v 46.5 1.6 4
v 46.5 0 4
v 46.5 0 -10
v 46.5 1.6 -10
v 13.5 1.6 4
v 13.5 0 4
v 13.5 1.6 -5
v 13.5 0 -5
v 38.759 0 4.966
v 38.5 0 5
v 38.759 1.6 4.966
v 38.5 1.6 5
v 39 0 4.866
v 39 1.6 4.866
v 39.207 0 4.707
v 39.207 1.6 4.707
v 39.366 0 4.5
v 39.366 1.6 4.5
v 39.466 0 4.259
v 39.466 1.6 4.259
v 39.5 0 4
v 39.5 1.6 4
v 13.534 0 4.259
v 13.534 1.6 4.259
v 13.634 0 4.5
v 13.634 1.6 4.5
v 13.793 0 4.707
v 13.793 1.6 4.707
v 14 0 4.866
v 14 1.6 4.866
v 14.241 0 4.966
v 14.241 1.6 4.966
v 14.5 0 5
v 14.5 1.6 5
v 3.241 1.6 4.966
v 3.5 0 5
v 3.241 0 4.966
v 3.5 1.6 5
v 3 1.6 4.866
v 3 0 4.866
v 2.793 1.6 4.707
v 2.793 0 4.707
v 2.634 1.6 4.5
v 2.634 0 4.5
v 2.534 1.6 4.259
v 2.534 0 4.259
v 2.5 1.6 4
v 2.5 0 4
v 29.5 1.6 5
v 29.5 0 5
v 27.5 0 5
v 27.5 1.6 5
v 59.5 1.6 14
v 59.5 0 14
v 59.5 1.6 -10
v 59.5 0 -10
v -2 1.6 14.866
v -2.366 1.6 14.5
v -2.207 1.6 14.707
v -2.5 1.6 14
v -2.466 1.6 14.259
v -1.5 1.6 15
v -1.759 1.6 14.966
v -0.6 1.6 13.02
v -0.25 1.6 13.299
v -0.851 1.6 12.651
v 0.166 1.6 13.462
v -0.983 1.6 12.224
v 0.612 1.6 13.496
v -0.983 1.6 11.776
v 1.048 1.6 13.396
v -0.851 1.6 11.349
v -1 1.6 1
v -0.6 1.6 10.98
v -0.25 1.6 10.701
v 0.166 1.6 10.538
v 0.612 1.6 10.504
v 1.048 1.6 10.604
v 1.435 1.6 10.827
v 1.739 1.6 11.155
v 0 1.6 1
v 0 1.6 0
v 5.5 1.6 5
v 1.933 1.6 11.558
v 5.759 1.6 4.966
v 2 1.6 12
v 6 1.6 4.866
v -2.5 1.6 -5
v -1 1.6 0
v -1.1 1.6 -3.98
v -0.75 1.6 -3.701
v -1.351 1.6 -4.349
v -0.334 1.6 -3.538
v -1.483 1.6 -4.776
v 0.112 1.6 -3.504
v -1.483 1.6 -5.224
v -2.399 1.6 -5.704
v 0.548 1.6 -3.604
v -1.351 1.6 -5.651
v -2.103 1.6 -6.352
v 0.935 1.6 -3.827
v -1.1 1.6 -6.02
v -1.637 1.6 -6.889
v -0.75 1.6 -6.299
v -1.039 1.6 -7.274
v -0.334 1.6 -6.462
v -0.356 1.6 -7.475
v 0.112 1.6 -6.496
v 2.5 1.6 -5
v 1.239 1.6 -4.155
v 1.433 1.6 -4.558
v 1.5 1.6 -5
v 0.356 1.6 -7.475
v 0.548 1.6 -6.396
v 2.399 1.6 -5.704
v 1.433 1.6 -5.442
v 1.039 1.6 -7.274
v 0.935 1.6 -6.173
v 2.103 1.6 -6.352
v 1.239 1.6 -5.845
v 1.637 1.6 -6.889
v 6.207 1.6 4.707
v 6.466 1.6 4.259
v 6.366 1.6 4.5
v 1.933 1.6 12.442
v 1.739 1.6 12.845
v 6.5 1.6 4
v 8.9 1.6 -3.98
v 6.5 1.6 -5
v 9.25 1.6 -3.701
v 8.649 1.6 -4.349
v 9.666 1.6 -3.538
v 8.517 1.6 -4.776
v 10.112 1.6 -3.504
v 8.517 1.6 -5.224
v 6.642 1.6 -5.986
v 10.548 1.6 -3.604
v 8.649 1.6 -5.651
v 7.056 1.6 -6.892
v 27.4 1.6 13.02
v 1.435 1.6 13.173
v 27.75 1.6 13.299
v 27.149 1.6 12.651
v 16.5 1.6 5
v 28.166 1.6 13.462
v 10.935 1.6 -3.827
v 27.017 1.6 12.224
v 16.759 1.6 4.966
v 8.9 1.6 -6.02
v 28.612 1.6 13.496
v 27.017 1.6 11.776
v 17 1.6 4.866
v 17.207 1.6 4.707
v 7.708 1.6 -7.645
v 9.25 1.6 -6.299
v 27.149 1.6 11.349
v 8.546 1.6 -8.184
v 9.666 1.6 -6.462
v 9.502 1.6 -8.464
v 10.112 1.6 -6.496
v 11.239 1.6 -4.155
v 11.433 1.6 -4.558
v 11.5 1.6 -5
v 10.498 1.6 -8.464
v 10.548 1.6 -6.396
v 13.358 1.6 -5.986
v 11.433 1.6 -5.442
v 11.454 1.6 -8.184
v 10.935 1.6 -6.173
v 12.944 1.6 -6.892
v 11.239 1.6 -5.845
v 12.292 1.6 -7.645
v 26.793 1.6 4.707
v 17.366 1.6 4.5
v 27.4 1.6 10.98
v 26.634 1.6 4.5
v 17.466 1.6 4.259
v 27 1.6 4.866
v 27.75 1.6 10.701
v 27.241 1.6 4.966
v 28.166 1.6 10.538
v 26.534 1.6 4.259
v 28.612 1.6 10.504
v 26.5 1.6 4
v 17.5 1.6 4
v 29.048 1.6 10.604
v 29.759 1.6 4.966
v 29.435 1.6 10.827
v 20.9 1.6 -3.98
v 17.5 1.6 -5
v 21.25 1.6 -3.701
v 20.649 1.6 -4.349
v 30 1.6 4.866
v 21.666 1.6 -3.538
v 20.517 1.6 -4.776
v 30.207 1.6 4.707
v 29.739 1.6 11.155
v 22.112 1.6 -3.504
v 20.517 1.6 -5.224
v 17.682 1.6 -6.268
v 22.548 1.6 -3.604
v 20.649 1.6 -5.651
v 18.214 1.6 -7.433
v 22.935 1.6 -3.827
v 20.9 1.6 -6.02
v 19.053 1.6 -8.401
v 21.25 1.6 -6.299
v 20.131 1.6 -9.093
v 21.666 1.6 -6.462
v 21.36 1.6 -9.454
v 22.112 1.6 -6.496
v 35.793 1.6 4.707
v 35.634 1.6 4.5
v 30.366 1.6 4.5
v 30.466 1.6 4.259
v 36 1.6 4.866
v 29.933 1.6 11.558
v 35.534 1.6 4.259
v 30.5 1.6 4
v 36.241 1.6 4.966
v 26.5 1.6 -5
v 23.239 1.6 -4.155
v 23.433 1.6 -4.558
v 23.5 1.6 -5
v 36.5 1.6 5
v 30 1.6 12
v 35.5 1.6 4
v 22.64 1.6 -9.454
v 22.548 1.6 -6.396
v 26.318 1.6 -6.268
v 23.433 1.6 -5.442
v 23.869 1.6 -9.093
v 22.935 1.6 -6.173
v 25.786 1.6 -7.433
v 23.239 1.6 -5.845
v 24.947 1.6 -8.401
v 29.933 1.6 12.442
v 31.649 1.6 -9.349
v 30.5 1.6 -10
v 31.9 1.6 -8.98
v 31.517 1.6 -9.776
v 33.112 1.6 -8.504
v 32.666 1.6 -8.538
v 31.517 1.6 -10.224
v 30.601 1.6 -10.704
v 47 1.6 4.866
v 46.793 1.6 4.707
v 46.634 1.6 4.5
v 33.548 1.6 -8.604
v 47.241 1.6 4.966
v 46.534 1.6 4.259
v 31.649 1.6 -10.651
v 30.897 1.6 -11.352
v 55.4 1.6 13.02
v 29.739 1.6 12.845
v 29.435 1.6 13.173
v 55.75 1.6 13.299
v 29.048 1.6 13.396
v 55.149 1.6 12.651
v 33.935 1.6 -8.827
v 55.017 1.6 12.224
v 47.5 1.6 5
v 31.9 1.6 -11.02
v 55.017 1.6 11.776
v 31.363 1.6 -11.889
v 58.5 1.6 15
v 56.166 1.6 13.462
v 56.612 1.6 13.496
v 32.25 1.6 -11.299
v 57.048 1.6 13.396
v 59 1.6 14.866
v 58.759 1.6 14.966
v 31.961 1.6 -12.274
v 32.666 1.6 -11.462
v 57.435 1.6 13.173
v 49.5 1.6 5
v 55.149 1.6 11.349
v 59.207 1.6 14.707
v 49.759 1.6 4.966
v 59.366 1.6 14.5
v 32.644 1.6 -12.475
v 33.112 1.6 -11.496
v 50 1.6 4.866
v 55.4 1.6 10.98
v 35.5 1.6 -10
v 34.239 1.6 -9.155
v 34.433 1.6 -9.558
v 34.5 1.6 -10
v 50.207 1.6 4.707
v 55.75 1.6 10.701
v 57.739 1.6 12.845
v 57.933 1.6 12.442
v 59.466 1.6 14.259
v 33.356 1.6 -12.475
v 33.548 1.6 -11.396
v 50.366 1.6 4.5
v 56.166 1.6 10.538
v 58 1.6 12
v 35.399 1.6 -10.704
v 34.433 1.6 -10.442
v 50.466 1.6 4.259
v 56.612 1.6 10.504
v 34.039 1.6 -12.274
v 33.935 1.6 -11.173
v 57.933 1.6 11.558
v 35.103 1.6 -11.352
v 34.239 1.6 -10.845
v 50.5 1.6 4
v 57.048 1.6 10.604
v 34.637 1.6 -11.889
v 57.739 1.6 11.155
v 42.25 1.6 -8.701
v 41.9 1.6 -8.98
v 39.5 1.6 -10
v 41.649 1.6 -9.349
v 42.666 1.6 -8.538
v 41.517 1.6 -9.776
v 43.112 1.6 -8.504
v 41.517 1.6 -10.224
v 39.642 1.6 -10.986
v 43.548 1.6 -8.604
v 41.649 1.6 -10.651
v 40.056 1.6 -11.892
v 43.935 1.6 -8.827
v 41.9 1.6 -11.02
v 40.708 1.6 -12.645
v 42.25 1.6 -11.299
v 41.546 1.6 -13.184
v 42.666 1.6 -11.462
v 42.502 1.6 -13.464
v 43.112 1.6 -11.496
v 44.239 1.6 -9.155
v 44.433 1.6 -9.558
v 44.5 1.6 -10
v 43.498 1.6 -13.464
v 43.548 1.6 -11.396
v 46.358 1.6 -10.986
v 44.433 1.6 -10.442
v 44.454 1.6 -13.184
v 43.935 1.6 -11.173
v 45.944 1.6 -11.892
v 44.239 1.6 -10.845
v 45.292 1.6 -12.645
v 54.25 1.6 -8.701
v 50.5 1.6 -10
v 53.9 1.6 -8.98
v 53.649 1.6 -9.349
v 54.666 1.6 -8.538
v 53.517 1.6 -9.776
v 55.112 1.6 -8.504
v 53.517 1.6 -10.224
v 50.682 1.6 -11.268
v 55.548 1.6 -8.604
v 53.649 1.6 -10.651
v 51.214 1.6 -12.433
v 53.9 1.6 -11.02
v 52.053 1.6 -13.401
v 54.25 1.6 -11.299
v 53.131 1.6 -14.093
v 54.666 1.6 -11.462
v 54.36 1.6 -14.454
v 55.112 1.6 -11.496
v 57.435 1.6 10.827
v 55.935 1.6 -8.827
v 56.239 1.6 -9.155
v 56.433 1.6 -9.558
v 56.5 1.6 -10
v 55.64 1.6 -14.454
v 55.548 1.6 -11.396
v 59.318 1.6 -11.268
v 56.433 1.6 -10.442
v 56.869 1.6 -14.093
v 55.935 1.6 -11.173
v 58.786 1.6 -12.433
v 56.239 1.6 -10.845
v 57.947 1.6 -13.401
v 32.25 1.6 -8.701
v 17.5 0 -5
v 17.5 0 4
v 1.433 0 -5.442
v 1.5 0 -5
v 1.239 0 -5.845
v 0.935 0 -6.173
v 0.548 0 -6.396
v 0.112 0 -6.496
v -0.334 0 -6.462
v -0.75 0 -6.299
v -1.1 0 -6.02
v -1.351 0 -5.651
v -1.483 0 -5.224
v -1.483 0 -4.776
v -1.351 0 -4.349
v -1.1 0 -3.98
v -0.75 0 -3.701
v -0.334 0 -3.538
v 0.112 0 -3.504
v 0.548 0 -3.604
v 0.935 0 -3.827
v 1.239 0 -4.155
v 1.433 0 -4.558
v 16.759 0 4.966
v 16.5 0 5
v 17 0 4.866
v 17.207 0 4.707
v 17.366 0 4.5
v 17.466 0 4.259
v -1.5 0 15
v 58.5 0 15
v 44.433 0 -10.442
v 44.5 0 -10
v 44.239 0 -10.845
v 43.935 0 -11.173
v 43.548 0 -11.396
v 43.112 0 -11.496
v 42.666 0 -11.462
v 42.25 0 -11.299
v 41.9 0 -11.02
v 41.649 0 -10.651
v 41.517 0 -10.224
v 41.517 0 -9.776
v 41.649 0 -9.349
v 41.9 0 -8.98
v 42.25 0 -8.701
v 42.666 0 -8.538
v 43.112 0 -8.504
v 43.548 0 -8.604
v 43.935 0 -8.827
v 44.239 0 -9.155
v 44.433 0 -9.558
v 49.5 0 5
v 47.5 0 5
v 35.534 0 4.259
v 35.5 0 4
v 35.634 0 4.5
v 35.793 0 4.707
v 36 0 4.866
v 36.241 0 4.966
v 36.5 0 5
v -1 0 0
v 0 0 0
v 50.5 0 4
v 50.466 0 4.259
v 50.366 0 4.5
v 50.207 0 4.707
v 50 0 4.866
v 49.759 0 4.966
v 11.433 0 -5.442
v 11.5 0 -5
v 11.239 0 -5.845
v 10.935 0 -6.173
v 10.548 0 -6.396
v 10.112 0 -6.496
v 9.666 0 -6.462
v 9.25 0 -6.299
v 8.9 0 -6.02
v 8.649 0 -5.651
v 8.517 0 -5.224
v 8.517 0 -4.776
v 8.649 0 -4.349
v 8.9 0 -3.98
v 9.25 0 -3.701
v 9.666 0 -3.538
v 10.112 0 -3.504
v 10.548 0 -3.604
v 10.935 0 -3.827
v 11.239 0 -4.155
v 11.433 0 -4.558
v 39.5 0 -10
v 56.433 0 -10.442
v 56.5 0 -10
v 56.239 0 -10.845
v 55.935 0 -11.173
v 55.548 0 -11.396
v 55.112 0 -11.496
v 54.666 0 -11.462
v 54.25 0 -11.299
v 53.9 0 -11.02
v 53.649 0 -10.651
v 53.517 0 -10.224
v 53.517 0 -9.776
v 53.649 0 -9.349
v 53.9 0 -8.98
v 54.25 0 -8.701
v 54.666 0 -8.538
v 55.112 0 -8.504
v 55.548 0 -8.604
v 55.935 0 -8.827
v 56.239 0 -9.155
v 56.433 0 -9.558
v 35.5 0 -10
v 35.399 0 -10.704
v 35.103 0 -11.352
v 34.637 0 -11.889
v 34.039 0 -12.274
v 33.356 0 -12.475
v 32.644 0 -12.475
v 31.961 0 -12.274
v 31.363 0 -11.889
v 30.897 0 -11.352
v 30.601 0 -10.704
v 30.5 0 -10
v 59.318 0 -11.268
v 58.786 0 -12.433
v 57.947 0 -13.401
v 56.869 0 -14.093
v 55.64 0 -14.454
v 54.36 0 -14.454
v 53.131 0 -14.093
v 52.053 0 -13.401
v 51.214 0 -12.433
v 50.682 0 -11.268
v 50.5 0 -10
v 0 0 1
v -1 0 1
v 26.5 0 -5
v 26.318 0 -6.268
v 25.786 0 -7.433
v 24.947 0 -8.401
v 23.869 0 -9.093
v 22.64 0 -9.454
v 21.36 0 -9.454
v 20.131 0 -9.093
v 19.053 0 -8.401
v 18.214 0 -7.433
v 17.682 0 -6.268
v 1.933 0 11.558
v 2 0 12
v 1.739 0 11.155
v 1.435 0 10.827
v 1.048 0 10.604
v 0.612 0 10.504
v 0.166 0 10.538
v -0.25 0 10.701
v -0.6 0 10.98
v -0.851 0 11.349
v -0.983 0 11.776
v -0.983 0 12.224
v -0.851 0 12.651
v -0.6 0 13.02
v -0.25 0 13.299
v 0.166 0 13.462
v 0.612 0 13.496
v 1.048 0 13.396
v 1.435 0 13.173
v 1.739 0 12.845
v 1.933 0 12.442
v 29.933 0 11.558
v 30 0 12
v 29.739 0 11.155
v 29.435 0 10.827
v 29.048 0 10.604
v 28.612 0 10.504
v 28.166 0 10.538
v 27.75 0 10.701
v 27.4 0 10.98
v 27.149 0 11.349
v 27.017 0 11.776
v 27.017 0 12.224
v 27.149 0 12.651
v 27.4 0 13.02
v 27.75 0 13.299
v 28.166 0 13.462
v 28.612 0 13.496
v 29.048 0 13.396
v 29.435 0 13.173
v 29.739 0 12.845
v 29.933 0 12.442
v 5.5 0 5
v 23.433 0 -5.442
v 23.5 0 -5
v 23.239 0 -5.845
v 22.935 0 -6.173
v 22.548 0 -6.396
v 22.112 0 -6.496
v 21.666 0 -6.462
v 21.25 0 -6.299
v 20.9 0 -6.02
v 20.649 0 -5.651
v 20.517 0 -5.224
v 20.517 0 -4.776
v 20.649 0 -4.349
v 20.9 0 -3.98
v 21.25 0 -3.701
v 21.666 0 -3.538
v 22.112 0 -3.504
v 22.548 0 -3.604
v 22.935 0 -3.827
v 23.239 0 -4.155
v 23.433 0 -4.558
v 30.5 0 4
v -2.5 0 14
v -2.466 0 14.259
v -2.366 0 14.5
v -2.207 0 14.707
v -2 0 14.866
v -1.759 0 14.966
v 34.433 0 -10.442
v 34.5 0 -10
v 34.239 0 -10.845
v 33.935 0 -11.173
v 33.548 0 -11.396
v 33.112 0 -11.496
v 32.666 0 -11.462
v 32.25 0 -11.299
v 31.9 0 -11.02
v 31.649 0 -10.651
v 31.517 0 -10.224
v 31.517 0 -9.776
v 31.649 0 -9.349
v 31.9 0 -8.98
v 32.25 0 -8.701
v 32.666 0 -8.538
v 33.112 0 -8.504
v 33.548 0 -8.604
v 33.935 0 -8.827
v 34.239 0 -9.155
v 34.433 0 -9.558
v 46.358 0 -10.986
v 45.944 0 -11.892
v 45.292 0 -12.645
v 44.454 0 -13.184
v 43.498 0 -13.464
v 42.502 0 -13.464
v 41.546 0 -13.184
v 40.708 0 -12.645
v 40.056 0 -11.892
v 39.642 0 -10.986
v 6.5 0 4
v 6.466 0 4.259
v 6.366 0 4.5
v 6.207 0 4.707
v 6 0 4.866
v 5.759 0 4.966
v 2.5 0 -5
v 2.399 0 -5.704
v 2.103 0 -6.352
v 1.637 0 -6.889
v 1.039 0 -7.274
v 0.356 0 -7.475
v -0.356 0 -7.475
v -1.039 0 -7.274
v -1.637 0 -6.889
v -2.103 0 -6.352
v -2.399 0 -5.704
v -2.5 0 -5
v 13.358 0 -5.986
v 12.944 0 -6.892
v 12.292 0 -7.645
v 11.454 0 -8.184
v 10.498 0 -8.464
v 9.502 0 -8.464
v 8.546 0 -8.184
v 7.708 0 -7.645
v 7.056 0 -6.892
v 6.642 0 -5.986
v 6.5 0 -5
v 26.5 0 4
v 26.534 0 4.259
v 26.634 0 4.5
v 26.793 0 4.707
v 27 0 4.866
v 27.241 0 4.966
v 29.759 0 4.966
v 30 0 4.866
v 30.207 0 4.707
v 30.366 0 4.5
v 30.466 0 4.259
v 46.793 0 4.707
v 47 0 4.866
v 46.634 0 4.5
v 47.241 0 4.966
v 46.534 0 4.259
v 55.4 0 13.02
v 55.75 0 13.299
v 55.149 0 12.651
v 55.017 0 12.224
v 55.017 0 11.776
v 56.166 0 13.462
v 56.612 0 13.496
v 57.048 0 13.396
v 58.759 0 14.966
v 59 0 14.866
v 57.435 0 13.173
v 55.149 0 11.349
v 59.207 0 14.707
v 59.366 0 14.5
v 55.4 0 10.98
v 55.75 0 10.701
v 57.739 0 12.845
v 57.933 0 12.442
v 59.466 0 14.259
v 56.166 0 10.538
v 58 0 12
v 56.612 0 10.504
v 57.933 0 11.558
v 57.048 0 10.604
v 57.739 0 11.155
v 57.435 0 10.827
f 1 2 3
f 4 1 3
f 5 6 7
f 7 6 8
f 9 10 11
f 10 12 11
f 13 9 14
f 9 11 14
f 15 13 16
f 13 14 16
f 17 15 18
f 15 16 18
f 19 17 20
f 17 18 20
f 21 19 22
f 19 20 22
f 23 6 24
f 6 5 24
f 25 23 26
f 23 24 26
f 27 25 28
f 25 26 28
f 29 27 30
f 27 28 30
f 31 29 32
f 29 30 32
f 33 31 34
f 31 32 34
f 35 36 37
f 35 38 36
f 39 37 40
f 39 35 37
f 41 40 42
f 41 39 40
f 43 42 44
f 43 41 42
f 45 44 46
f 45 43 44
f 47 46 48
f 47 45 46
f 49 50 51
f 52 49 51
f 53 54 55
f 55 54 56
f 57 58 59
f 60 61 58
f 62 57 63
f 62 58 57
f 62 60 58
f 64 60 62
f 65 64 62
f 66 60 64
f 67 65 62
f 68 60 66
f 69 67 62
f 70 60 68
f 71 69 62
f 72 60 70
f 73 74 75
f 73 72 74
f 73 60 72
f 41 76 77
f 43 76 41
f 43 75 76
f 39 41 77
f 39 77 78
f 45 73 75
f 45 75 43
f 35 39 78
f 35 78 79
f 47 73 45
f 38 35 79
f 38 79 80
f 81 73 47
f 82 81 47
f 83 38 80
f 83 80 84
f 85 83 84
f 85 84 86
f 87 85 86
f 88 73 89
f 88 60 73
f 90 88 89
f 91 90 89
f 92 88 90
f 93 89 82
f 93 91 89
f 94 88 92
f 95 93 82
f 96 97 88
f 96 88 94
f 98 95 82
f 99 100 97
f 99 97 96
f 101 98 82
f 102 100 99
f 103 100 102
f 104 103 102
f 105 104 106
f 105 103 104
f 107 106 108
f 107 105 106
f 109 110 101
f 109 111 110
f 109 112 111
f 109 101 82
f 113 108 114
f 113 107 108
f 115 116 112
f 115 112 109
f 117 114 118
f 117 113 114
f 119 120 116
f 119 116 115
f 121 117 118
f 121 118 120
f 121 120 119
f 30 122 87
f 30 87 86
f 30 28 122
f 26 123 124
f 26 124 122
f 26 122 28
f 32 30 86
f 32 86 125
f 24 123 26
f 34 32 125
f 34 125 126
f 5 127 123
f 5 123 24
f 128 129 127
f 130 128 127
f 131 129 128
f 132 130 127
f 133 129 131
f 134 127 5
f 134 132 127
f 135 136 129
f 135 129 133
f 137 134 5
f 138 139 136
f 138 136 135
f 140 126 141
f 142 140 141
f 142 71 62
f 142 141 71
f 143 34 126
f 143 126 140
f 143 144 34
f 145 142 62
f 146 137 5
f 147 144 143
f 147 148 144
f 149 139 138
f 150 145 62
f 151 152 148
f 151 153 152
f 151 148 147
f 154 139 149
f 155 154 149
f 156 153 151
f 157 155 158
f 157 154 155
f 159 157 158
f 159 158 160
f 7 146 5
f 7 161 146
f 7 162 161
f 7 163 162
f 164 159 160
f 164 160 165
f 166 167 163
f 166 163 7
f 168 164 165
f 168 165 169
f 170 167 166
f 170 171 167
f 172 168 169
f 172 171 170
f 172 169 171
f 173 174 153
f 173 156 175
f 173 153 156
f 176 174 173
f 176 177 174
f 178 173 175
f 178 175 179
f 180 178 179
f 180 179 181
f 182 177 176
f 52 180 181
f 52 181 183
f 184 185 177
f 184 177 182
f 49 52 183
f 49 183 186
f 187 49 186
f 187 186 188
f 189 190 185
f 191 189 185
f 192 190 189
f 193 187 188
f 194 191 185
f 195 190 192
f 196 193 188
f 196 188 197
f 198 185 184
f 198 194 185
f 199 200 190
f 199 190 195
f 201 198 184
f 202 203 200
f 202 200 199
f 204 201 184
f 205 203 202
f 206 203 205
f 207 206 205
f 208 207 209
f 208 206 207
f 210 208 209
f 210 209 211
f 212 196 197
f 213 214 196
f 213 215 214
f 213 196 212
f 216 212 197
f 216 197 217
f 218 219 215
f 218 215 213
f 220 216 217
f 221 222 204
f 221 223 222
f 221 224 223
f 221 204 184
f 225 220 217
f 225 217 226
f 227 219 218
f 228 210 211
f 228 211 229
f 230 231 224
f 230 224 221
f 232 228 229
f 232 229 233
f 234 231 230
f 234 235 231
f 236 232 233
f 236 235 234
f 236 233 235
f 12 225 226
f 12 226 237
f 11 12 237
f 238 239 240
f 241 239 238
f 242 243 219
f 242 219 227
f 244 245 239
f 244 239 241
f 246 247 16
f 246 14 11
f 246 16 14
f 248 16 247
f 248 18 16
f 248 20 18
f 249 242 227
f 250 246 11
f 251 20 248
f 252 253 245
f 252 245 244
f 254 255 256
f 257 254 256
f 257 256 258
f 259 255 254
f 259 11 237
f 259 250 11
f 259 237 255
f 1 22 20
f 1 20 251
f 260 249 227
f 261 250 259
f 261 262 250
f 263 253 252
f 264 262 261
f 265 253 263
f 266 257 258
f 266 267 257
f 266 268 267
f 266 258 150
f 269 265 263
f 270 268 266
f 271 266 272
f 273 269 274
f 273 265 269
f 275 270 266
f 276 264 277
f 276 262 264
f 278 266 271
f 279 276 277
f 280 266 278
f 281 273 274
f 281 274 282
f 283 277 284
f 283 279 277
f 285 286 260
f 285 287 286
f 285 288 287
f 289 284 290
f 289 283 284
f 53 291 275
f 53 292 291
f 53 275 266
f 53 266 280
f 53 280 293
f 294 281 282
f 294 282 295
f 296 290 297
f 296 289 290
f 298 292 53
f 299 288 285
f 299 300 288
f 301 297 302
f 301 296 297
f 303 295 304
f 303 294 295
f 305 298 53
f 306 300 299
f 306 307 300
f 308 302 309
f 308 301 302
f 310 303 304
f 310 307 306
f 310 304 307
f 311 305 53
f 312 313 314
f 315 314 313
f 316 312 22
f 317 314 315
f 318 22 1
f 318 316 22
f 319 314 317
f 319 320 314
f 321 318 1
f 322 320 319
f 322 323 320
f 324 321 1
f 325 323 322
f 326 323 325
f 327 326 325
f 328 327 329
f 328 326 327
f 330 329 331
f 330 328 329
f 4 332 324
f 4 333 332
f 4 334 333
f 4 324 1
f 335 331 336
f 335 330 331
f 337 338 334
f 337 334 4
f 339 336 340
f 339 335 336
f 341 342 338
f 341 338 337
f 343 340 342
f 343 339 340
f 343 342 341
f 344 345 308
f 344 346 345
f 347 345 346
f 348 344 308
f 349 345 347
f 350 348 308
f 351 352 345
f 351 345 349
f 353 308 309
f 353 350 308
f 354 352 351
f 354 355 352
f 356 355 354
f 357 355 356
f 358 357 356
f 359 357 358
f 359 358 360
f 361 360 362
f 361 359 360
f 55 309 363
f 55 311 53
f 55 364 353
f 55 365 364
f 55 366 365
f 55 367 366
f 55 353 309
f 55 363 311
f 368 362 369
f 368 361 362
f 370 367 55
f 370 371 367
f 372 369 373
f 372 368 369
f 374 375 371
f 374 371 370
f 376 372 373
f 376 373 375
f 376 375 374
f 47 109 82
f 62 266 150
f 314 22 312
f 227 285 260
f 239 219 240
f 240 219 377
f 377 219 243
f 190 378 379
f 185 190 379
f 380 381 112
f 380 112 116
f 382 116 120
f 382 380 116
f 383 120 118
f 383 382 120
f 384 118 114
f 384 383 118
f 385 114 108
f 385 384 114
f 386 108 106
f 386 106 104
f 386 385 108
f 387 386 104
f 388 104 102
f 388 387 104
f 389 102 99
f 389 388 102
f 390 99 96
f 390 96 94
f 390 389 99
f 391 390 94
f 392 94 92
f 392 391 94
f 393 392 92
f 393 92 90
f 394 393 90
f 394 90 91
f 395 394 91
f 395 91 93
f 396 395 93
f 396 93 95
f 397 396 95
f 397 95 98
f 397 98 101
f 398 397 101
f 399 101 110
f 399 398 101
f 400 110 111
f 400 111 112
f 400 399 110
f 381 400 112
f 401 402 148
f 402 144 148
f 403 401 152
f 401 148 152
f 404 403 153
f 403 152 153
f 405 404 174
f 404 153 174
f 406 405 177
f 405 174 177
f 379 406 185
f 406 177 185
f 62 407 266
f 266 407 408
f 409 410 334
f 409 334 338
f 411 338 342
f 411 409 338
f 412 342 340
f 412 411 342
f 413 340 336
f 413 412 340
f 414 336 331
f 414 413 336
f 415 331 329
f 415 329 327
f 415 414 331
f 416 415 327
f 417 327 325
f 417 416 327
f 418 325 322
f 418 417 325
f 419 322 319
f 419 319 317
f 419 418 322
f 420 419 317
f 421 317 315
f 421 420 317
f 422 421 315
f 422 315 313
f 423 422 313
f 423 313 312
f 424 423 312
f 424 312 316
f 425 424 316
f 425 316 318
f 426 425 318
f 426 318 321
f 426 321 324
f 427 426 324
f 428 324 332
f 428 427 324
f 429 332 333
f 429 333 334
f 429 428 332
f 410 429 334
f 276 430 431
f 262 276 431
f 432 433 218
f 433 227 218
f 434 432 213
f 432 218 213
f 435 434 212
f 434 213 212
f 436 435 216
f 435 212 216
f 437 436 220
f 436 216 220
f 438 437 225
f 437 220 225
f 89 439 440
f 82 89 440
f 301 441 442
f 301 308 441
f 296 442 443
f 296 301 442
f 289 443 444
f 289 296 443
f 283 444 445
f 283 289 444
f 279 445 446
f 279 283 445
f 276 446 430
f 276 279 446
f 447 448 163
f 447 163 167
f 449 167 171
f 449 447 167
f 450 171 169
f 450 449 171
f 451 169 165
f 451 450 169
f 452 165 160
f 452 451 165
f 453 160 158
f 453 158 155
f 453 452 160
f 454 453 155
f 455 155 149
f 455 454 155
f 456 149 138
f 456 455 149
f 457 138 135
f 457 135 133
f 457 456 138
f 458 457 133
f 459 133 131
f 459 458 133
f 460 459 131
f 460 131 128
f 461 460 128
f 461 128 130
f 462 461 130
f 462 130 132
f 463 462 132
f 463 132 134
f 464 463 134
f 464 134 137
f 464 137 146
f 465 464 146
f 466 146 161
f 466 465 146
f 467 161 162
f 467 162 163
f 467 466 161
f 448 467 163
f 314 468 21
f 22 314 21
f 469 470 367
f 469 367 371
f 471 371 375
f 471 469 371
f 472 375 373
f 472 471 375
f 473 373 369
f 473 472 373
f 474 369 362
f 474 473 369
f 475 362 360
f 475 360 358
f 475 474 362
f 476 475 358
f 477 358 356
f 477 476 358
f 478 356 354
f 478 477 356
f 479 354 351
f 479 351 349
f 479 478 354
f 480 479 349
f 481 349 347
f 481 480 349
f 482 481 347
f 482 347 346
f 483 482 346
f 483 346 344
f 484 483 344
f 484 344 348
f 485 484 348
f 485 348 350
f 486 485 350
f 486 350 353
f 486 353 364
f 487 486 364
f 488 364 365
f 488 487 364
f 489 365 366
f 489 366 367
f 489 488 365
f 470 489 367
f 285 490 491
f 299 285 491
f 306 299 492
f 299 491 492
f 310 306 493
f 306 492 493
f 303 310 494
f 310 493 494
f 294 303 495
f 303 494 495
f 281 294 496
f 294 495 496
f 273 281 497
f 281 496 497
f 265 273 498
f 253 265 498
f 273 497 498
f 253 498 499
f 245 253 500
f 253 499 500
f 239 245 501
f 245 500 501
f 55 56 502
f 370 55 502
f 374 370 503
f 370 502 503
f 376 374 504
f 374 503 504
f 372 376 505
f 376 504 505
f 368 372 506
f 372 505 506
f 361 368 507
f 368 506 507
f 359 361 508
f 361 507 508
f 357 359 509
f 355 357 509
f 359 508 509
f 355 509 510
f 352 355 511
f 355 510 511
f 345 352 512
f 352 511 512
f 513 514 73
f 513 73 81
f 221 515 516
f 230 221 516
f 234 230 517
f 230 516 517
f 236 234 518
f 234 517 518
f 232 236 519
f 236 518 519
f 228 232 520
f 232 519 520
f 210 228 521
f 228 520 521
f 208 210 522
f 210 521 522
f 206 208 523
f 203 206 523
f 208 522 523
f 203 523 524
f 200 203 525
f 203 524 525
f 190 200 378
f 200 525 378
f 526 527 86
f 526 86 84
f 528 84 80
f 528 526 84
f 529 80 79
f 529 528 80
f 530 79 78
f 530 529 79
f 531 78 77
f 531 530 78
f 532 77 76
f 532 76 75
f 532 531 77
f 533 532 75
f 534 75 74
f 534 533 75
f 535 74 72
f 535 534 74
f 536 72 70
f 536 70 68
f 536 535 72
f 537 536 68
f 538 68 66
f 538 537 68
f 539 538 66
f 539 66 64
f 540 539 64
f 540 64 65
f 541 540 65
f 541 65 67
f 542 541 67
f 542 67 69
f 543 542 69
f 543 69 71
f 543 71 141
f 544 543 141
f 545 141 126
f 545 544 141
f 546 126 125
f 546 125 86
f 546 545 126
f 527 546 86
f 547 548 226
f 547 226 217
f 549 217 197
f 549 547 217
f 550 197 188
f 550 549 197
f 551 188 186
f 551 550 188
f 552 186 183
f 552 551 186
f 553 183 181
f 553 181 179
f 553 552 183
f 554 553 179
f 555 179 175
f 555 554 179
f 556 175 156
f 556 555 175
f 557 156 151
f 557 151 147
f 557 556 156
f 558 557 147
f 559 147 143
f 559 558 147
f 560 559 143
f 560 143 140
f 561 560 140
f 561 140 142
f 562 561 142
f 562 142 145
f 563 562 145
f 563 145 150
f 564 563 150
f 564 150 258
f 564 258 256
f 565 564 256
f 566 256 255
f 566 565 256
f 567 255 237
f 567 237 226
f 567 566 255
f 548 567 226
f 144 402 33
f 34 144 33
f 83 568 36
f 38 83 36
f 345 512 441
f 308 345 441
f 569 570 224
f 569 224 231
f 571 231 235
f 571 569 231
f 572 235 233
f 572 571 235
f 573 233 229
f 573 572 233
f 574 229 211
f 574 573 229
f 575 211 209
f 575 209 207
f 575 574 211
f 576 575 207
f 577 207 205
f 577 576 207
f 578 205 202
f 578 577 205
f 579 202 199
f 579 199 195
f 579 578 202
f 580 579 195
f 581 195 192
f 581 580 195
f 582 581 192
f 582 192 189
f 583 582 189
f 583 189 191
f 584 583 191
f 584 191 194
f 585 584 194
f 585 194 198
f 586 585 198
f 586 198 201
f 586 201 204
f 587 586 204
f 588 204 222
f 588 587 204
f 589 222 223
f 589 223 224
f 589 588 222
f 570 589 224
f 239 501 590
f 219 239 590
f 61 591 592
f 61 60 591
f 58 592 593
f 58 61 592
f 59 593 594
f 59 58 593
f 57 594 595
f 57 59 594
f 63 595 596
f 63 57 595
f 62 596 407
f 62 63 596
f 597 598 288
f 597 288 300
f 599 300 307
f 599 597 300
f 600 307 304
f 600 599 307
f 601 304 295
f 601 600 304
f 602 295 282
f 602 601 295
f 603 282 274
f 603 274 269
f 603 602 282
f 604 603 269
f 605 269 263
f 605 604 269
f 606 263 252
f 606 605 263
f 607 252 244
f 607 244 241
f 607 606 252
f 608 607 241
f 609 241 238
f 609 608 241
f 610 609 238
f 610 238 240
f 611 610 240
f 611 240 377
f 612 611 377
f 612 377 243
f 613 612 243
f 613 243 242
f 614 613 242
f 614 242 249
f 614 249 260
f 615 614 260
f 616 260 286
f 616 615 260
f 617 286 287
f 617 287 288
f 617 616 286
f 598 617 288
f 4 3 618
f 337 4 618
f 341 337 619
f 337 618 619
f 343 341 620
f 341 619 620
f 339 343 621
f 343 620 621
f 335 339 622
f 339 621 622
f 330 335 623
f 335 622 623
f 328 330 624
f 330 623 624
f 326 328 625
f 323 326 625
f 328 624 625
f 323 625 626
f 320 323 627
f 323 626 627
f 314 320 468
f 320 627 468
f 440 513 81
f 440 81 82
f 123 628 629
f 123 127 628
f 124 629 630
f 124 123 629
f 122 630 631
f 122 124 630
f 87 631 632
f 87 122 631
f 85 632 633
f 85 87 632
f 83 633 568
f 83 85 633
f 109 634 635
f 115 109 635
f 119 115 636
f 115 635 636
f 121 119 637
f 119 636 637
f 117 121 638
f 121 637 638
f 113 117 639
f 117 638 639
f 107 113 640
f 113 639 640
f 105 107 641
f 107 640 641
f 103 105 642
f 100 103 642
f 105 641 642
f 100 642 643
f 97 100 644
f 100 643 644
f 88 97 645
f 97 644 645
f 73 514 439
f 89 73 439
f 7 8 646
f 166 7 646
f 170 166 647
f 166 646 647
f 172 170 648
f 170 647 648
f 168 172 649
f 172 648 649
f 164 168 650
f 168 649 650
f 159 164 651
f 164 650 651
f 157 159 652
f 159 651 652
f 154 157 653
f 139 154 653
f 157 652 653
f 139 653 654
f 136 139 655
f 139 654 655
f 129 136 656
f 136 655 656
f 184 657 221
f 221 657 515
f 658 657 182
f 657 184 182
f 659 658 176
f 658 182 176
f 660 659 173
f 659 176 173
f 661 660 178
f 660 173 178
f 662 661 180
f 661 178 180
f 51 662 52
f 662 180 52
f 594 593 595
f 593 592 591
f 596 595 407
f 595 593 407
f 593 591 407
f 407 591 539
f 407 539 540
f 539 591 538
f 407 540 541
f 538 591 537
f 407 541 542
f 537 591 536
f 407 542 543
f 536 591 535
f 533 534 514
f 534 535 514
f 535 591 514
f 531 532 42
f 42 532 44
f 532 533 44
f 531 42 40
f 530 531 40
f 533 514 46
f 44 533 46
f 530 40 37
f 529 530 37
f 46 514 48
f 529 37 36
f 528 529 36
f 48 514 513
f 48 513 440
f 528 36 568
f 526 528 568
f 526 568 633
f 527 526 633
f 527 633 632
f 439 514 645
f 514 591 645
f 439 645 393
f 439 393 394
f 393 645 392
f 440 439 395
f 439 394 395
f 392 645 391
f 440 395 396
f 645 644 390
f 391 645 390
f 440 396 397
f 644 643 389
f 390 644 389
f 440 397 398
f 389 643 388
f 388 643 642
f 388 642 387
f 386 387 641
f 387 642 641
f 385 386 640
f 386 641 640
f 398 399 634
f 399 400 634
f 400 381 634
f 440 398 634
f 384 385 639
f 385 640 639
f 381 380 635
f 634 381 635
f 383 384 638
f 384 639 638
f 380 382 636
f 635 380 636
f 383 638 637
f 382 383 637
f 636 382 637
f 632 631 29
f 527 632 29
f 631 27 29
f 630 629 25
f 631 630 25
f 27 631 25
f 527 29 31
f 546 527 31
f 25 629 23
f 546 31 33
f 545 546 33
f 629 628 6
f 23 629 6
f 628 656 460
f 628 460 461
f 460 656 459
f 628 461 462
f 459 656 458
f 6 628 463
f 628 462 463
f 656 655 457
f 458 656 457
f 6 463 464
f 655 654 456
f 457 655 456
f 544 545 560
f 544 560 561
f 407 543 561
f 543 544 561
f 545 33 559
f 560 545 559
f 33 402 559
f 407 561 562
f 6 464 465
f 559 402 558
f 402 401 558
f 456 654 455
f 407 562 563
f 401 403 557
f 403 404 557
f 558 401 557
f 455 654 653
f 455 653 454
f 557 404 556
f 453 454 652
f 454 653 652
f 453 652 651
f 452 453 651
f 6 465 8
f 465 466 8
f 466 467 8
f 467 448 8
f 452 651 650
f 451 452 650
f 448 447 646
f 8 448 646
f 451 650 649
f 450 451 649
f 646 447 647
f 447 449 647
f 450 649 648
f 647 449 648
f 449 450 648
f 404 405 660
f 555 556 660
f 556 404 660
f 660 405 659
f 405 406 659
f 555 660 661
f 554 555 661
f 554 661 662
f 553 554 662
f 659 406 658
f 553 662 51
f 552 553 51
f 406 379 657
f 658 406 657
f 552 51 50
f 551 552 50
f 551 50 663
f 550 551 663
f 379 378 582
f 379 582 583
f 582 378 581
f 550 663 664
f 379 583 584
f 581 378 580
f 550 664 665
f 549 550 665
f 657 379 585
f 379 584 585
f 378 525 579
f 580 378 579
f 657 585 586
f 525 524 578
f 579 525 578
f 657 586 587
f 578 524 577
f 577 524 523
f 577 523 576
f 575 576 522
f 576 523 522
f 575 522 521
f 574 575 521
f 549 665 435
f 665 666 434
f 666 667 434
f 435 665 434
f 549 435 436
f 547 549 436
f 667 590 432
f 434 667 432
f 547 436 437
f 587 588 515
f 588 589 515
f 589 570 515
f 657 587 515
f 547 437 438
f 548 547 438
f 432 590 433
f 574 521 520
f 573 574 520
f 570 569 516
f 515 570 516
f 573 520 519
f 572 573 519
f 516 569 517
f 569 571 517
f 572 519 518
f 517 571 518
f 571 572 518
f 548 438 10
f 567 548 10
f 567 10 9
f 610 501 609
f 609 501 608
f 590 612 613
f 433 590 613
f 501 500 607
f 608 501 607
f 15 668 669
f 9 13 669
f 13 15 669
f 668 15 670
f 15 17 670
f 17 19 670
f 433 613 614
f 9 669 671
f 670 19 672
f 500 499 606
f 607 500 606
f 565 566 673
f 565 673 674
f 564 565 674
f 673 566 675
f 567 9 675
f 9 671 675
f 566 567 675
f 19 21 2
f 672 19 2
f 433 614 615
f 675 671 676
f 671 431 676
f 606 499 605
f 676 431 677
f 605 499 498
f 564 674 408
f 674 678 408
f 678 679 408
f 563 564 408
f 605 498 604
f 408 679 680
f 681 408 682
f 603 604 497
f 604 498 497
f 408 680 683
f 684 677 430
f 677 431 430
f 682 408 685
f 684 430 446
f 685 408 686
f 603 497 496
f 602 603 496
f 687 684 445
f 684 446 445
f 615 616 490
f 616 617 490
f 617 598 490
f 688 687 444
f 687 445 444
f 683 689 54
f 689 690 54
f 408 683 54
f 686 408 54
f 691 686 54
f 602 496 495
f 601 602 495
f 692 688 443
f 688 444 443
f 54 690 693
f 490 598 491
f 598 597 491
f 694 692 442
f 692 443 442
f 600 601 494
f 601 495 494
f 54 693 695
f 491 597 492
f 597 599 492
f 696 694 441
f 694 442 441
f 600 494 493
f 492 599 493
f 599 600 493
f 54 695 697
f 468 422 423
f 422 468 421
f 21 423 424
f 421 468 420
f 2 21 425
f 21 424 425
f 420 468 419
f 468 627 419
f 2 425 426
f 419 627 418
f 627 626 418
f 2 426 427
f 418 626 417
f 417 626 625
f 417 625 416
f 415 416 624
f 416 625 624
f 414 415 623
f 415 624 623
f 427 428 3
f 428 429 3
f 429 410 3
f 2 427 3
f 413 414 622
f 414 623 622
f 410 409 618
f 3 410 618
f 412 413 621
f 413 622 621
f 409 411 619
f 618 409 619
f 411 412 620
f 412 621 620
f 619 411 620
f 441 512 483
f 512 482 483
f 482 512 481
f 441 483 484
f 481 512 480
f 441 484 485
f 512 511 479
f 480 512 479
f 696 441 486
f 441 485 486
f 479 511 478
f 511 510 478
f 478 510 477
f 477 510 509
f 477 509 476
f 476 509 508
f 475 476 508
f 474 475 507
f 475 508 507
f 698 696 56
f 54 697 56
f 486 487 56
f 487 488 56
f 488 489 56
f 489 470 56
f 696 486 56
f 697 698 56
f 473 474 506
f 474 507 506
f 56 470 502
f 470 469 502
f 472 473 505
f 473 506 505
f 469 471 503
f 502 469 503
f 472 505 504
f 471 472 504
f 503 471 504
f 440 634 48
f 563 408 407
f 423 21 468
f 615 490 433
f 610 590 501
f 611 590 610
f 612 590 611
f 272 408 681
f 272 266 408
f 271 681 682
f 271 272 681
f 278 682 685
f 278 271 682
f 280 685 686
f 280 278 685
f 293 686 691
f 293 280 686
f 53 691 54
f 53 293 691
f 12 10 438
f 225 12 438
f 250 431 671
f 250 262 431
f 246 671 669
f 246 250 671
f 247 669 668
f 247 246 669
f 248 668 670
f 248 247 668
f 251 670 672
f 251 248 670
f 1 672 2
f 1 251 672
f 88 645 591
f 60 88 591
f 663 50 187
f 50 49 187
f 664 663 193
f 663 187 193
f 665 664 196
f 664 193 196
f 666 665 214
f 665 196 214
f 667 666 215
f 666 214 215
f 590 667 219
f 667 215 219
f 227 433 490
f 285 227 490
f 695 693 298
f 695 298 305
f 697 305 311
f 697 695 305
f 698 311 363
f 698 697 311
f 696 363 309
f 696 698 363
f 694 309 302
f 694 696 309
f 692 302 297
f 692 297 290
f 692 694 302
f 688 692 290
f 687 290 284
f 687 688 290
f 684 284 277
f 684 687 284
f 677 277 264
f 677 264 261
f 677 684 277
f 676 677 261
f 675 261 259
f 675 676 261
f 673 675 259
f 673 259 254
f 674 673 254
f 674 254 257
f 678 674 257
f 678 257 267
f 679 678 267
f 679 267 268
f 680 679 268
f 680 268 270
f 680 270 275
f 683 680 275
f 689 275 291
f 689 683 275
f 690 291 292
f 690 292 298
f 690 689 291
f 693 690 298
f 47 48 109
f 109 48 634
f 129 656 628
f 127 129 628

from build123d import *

# Parameters (mm, degrees)
SKETCH1_R           = 1.5
SKETCH1_W           = 1
SKETCH1_H           = 1
BOSS_EXTRUDE1_DEPTH = 1.6
FILLET1_R           = 1


with BuildPart() as part:
    # Sketch1 → Boss-Extrude1 (new body)
    with BuildSketch(Plane(origin=(0, 0, 0), x_dir=(1, 0, 0), z_dir=(0, 1, 0))):
        with BuildLine():
            ThreePointArc((13.5, 5), (10, 8.5), (6.5, 5))
            Line((6.5, 5), (6.5, -5))
            Line((6.5, -5), (2.5, -5))
            Line((2.5, -5), (2.5, 5))
            ThreePointArc((2.5, 5), (0, 7.5), (-2.5, 5))
            Line((-2.5, 5), (-2.5, -15))
            Line((-2.5, -15), (59.5, -15))
            Line((59.5, -15), (59.5, 10))
            ThreePointArc((59.5, 10), (55, 14.5), (50.5, 10))
            Line((50.5, 10), (50.5, -5))
            Line((50.5, -5), (46.5, -5))
            Line((46.5, -5), (46.5, 10))
            ThreePointArc((46.5, 10), (43, 13.5), (39.5, 10))
            Line((39.5, 10), (39.5, -5))
            Line((39.5, -5), (35.5, -5))
            Line((35.5, -5), (35.5, 10))
            ThreePointArc((35.5, 10), (33, 12.5), (30.5, 10))
            Line((30.5, 10), (30.5, -5))
            Line((30.5, -5), (26.5, -5))
            Line((26.5, -5), (26.5, 5))
            ThreePointArc((26.5, 5), (22, 9.5), (17.5, 5))
            Line((17.5, 5), (17.5, -5))
            Line((17.5, -5), (13.5, -5))
            Line((13.5, -5), (13.5, 5))
        make_face()
        with Locations((10, 5)):
            Circle(SKETCH1_R, mode=Mode.SUBTRACT)
        with Locations((56.5, -12)):
            Circle(SKETCH1_R, mode=Mode.SUBTRACT)
        with Locations((0.5, -12)):
            Circle(SKETCH1_R, mode=Mode.SUBTRACT)
        with Locations((28.5, -12)):
            Circle(SKETCH1_R, mode=Mode.SUBTRACT)
        with Locations((0, 5)):
            Circle(SKETCH1_R, mode=Mode.SUBTRACT)
        with Locations((-0.5, -0.5)):
            Rectangle(SKETCH1_W, SKETCH1_H, mode=Mode.SUBTRACT)
        with Locations((22, 5)):
            Circle(SKETCH1_R, mode=Mode.SUBTRACT)
        with Locations((33, 10)):
            Circle(SKETCH1_R, mode=Mode.SUBTRACT)
        with Locations((55, 10)):
            Circle(SKETCH1_R, mode=Mode.SUBTRACT)
        with Locations((43, 10)):
            Circle(SKETCH1_R, mode=Mode.SUBTRACT)
    extrude(amount=BOSS_EXTRUDE1_DEPTH)

    # Fillet1
    fillet1_edges = [part.edges().sort_by_distance(p)[0] for p in [
        (2.5, 0.8, 5),
        (6.5, 0.8, 5),
        (13.5, 0.8, 5),
        (17.5, 0.8, 5),
        (26.5, 0.8, 5),
        (30.5, 0.8, 5),
        (35.5, 0.8, 5),
        (39.5, 0.8, 5),
        (46.5, 0.8, 5),
        (50.5, 0.8, 5),
        (59.5, 0.8, 15),
        (-2.5, 0.8, 15),
    ]]
    fillet(fillet1_edges, radius=FILLET1_R)


solid = part.part
